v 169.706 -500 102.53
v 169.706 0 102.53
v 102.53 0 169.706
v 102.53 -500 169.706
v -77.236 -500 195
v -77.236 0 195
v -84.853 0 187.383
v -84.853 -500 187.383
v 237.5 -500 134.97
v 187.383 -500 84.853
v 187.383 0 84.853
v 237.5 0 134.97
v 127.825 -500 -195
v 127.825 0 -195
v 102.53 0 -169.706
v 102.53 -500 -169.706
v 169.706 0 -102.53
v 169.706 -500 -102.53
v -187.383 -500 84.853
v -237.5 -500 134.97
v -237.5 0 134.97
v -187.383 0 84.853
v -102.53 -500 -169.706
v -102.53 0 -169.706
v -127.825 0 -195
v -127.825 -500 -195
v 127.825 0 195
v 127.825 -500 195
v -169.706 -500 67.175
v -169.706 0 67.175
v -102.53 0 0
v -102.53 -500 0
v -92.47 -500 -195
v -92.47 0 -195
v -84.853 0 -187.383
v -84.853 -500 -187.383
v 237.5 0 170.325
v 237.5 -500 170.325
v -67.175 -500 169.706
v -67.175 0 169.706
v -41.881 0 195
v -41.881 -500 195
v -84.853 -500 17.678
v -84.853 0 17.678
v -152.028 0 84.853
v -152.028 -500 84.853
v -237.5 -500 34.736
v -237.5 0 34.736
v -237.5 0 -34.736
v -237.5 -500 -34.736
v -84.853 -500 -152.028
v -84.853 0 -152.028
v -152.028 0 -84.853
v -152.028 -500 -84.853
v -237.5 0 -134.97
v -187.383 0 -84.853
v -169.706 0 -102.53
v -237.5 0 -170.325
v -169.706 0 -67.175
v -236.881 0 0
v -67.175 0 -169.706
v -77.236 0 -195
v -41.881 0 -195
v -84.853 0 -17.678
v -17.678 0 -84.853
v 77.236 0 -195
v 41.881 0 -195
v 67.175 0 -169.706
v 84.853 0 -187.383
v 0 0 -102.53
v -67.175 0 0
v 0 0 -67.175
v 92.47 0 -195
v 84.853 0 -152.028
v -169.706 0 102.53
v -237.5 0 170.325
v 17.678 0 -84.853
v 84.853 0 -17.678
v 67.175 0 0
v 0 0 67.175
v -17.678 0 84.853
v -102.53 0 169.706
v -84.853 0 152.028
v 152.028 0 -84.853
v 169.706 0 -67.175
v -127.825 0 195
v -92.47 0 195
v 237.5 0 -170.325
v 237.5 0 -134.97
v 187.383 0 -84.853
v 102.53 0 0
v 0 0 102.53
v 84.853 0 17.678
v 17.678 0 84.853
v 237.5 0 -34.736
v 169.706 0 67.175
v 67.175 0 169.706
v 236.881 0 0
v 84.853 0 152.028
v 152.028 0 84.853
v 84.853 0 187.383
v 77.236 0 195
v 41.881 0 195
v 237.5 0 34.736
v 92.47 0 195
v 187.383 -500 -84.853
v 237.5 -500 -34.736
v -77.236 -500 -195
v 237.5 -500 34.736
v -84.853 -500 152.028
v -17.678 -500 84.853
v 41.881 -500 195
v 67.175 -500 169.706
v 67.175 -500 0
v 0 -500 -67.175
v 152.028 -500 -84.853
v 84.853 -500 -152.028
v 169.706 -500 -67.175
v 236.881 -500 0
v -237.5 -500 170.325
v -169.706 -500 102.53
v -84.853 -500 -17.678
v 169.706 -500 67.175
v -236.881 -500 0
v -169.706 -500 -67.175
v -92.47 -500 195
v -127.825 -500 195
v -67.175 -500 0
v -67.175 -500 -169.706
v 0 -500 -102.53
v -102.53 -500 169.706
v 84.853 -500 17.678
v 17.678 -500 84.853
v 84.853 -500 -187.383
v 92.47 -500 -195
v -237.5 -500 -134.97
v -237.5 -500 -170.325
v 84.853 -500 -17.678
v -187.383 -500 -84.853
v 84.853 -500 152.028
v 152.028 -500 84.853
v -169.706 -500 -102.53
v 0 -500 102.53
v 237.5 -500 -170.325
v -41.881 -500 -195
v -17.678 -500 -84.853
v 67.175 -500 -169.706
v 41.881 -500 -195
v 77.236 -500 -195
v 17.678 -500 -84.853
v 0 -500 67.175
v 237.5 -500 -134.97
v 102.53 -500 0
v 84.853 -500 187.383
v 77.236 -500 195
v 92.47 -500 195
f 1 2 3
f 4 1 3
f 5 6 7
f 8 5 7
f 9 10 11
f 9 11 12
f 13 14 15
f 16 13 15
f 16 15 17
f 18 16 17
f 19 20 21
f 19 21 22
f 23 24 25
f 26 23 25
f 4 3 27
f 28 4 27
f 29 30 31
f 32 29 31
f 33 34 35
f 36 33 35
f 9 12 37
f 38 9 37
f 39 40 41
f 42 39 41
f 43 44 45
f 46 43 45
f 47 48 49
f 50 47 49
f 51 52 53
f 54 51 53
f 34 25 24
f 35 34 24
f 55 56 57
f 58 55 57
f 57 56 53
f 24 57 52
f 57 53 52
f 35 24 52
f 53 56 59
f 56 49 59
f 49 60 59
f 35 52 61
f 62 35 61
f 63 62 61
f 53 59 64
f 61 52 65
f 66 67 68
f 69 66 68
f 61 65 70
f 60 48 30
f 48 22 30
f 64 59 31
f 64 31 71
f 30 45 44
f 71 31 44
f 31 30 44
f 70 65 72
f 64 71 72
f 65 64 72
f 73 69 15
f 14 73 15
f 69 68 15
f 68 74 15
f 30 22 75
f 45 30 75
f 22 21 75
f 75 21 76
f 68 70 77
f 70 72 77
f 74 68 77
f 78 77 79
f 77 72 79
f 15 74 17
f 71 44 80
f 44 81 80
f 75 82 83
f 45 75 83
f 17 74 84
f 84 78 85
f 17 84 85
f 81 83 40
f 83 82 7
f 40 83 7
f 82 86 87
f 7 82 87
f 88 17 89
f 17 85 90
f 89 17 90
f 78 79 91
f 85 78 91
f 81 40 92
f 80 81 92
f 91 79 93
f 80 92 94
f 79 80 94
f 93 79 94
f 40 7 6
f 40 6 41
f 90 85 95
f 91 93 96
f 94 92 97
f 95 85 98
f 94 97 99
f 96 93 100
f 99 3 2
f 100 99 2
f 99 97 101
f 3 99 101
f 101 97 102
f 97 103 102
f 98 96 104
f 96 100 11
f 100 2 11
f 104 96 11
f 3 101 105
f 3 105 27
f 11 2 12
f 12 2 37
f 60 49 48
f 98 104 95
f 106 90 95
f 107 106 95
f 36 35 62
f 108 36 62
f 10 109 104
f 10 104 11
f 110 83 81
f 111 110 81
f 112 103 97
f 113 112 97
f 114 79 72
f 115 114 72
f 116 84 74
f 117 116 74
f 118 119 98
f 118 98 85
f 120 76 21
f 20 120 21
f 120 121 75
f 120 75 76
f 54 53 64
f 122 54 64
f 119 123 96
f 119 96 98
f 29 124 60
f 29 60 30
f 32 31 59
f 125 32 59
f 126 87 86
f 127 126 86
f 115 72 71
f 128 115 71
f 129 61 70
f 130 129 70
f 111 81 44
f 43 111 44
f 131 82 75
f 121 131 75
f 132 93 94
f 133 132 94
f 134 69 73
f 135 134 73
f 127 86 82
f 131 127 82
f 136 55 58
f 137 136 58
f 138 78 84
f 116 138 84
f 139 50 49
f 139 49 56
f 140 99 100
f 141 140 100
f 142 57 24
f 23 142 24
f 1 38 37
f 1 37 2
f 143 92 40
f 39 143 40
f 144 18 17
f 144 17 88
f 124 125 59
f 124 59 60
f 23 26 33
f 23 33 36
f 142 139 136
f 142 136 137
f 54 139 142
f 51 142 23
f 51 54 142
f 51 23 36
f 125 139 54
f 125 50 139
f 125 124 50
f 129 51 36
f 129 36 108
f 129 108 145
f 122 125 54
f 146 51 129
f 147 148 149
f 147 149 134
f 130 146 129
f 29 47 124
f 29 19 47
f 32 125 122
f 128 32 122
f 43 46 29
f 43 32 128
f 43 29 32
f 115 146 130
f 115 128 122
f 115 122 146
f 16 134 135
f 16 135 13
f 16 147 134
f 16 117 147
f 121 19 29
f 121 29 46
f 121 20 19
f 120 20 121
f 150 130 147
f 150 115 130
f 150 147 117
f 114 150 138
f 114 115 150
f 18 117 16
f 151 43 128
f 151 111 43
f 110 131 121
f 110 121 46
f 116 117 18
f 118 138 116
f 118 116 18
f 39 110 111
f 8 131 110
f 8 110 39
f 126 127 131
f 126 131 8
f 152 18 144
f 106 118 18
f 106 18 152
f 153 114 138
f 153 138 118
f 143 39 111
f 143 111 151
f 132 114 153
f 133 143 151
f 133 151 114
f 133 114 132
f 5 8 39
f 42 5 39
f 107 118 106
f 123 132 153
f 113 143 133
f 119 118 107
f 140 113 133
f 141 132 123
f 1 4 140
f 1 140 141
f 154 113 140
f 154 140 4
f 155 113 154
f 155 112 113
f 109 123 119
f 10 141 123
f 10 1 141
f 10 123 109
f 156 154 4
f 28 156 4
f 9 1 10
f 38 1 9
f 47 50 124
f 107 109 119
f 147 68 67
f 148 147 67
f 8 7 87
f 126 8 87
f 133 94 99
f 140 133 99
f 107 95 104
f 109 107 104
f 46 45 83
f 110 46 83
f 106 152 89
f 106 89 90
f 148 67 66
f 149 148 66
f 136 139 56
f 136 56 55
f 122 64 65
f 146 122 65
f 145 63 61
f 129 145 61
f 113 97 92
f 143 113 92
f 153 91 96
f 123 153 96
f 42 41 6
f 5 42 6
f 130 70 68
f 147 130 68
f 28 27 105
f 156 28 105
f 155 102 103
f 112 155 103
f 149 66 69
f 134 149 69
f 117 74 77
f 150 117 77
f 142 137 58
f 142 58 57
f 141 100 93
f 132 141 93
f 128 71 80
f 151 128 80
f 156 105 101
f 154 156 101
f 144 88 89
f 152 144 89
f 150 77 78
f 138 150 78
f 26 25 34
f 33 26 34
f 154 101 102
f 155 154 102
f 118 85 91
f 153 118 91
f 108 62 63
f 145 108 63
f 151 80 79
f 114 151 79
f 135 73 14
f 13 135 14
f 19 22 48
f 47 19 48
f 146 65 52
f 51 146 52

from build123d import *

# Parameters (mm, degrees)
F1_DEPTH = 500


with BuildPart() as f1:
    # F0 (on Front) → F1 (new body)
    with BuildSketch(Plane.XZ):
        Polygon((237.5, 0.619228), (237.5, 34.736111), (187.383297, 84.852814), (237.5, 134.969517), (237.5, 170.324856), (169.705627, 102.530483), (102.530483, 169.705627), (127.824856, 195), (92.469517, 195), (84.852814, 187.383297), (77.236111, 195), (41.880772, 195), (67.175144, 169.705627), (0, 102.530483), (-67.175144, 169.705627), (-41.880772, 195), (-77.236111, 195), (-84.852814, 187.383297), (-92.469517, 195), (-127.824856, 195), (-102.530483, 169.705627), (-169.705627, 102.530483), (-237.5, 170.324856), (-237.5, 134.969517), (-187.383297, 84.852814), (-237.5, 34.736111), (-237.5, 0.619228), (-236.880772, 0), (-237.5, -0.619228), (-237.5, -34.736111), (-187.383297, -84.852814), (-237.5, -134.969517), (-237.5, -170.324856), (-169.705627, -102.530483), (-102.530483, -169.705627), (-127.824856, -195), (-92.469517, -195), (-84.852814, -187.383297), (-77.236111, -195), (-41.880772, -195), (-67.175144, -169.705627), (0, -102.530483), (67.175144, -169.705627), (41.880772, -195), (77.236111, -195), (84.852814, -187.383297), (92.469517, -195), (127.824856, -195), (102.530483, -169.705627), (169.705627, -102.530483), (237.5, -170.324856), (237.5, -134.969517), (187.383297, -84.852814), (237.5, -34.736111), (237.5, -0.619228), (236.880772, 0), align=None)
        Polygon((-17.67767, -84.852814), (-84.852814, -152.027958), (-152.027958, -84.852814), (-84.852814, -17.67767), align=None, mode=Mode.SUBTRACT)
        Polygon((152.027958, -84.852814), (84.852814, -152.027958), (17.67767, -84.852814), (84.852814, -17.67767), align=None, mode=Mode.SUBTRACT)
        Polygon((-169.705627, -67.175144), (-236.880772, 0), (-169.705627, 67.175144), (-102.530483, 0), align=None, mode=Mode.SUBTRACT)
        Polygon((67.175144, 0), (0, -67.175144), (-67.175144, 0), (0, 67.175144), align=None, mode=Mode.SUBTRACT)
        Polygon((-17.67767, 84.852814), (-84.852814, 17.67767), (-152.027958, 84.852814), (-84.852814, 152.027958), align=None, mode=Mode.SUBTRACT)
        Polygon((152.027958, 84.852814), (84.852814, 17.67767), (17.67767, 84.852814), (84.852814, 152.027958), align=None, mode=Mode.SUBTRACT)
        Polygon((169.705627, 67.175144), (236.880772, 0), (169.705627, -67.175144), (102.530483, 0), align=None, mode=Mode.SUBTRACT)
        Polygon((237.5, -0.619228), (237.5, 0.619228), (236.880772, 0), align=None)
        Polygon((-236.880772, 0), (-237.5, 0.619228), (-237.5, -0.619228), align=None)
    extrude(amount=F1_DEPTH)


solid = f1.part
